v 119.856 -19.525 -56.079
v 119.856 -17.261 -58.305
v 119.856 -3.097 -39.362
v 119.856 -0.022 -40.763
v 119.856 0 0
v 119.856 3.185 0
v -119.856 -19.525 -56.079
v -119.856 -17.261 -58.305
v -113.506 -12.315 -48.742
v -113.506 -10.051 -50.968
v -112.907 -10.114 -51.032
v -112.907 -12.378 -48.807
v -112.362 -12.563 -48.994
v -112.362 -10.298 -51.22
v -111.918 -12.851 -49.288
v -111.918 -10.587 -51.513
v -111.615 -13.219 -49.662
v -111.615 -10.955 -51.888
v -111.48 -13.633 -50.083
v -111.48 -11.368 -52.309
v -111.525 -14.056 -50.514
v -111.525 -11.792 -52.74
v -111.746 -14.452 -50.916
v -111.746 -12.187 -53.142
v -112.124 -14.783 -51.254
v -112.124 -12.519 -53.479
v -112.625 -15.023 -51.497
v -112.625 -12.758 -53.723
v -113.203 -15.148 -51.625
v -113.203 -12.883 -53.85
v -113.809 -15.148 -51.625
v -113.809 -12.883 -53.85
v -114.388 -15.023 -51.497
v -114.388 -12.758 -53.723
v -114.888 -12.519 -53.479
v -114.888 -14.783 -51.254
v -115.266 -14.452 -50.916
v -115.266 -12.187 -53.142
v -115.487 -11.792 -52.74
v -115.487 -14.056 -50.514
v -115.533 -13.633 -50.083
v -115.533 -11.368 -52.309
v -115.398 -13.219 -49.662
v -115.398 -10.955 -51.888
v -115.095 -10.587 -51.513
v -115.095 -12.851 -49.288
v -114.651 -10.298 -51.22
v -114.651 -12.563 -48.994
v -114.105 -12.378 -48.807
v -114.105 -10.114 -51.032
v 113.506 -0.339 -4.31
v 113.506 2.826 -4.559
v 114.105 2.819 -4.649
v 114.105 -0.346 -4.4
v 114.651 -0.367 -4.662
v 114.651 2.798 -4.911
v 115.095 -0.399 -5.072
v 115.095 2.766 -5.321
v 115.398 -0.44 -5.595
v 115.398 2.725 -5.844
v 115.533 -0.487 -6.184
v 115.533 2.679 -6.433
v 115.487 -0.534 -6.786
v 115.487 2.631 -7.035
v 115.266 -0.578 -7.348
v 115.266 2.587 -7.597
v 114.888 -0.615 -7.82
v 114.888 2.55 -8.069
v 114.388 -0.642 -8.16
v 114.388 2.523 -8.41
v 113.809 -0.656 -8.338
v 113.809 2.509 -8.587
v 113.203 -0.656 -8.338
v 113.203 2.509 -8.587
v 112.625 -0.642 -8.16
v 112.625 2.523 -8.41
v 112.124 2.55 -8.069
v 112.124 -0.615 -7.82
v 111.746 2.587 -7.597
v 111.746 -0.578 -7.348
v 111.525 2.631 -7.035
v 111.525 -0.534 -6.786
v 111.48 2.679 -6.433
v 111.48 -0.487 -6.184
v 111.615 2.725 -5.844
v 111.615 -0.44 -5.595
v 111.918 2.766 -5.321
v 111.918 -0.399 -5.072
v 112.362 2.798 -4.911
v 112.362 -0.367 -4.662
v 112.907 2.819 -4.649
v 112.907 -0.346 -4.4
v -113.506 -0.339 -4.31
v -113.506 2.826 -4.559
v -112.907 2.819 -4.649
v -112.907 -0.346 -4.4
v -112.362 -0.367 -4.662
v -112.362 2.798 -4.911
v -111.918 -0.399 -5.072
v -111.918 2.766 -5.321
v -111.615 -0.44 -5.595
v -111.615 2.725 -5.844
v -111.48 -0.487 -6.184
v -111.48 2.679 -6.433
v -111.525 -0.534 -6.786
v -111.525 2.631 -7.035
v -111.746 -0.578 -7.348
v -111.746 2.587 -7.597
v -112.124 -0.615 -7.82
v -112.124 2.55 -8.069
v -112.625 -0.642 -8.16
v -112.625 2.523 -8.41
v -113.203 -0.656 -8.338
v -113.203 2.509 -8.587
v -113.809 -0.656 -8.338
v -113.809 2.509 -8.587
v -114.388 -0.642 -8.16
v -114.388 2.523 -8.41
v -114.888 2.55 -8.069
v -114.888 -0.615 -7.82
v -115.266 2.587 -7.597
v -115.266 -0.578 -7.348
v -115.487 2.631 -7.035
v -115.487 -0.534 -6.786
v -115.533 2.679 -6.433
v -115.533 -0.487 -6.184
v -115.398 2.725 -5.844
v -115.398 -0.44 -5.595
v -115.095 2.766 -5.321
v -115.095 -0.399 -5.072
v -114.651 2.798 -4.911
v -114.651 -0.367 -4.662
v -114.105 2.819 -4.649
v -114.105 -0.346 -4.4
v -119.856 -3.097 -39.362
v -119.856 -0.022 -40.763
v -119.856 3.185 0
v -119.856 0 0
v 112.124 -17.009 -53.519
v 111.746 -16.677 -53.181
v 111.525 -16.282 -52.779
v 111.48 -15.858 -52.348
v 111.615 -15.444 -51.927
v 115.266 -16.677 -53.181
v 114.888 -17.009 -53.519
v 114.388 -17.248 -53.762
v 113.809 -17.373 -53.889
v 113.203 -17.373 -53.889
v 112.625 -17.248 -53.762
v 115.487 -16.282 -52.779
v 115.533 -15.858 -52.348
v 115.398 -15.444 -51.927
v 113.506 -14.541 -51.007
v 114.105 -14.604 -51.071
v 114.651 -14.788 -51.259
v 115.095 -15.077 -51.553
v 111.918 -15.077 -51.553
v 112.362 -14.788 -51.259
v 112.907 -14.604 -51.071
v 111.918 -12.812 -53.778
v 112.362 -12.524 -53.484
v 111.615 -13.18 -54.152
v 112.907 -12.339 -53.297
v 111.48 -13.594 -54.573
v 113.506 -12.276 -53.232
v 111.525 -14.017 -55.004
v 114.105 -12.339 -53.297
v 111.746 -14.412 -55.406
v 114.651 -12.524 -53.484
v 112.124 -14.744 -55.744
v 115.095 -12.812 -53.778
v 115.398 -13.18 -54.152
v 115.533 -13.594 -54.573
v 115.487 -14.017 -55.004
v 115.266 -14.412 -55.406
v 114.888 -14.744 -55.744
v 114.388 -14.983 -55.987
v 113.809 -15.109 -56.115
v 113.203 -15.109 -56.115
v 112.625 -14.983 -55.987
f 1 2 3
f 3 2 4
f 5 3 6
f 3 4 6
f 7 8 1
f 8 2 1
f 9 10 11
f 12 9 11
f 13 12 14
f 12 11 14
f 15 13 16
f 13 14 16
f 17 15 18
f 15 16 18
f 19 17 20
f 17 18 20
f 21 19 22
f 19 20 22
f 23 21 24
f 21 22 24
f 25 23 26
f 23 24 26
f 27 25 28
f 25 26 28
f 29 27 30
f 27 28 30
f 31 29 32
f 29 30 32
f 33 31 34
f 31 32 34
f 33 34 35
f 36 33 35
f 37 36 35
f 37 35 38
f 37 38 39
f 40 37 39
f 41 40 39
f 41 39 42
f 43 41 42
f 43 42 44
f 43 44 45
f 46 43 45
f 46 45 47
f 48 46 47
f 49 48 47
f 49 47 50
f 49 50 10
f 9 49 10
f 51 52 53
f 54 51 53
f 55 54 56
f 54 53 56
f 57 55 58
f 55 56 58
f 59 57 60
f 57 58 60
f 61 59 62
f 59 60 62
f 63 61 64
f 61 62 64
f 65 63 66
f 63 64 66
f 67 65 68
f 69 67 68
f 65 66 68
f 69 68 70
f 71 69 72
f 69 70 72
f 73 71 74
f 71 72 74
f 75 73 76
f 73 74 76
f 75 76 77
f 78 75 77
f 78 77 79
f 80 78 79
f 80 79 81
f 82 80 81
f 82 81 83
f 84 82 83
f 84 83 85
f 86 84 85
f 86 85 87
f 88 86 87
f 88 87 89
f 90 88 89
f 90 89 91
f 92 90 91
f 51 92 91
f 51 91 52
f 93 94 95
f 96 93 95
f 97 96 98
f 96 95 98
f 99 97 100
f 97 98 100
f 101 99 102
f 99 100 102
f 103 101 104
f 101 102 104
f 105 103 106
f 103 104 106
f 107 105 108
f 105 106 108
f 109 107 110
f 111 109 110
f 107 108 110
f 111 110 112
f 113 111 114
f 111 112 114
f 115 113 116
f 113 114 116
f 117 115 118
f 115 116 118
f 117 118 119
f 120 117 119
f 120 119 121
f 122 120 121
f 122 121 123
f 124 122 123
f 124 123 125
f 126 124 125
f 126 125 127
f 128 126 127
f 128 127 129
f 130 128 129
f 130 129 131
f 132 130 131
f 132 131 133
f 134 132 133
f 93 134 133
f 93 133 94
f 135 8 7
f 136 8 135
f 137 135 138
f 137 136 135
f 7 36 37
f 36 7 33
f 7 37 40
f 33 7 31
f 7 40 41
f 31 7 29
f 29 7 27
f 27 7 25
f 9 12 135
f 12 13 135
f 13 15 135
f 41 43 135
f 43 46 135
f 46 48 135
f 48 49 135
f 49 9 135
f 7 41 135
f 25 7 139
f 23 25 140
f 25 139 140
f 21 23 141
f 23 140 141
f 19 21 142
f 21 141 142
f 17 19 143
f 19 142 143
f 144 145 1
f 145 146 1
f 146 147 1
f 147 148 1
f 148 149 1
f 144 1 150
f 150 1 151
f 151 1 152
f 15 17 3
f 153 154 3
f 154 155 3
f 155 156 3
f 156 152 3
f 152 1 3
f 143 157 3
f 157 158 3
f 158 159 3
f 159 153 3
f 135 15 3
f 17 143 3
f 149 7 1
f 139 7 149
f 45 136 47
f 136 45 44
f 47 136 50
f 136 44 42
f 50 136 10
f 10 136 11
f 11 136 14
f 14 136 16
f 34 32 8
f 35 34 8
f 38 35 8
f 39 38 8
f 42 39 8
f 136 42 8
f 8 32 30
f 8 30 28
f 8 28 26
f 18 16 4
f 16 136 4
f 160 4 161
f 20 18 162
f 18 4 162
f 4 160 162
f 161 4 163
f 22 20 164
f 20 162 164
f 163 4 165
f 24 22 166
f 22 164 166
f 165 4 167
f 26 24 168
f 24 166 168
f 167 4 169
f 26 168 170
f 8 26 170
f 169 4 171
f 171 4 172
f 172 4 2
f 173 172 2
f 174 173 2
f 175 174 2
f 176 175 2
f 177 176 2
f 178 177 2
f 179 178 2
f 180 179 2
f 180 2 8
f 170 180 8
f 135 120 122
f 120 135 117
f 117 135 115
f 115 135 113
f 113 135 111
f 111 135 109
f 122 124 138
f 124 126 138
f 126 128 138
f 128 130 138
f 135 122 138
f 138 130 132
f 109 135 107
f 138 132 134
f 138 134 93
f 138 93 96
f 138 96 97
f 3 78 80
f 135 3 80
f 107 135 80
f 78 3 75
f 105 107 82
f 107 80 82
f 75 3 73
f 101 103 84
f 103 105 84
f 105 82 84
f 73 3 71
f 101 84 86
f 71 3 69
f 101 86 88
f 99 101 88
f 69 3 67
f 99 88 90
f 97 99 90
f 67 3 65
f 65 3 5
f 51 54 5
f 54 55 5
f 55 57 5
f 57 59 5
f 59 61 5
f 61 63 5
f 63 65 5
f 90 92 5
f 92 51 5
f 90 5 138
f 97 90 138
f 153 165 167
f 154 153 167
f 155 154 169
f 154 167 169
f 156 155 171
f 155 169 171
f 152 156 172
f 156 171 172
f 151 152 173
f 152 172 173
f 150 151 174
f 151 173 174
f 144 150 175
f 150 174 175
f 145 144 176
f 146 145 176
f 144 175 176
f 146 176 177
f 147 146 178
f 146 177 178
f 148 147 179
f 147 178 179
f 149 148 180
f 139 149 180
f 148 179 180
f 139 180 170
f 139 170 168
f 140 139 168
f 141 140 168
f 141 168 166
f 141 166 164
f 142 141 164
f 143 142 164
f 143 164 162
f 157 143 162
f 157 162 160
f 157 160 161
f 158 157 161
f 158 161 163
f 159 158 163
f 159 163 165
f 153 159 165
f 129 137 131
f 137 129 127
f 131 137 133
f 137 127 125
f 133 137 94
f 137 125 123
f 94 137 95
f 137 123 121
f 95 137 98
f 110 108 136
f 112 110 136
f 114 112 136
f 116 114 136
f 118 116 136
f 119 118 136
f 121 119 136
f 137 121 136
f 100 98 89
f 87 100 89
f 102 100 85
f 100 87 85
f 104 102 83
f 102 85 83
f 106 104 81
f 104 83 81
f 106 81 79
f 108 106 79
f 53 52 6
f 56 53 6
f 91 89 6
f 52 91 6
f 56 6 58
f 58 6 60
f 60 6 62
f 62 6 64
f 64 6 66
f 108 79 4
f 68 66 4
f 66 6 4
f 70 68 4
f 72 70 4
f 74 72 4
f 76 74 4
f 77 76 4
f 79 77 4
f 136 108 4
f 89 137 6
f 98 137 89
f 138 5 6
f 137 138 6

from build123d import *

# Parameters (mm, degrees)
BOSS_EXTRUDE1_DEPTH = 119.85625
SKETCH2_R           = 2.032
CUT_EXTRUDE1_DEPTH  = 136.095780221
SKETCH3_R           = 2.032
CUT_EXTRUDE2_DEPTH  = 12.7


with BuildPart() as part:
    # Sketch1 → Boss-Extrude1 (new, symmetric)
    with BuildSketch(Plane(origin=(0, 0, 0), x_dir=(0, 0, -1), z_dir=(1, 0, 0))):
        Polygon((0, 0), (0, 3.184811635), (40.762900177, -0.022300578), (58.304880654, -17.260912049), (56.079483543, -19.525472204), (39.361772519, -3.096875365), align=None)
    extrude(amount=BOSS_EXTRUDE1_DEPTH, both=True)

    # Sketch2 → Cut-Extrude1 (cut, through all)
    with BuildSketch(Plane(origin=(0, 3.165218593, -0.249030642), x_dir=(1, 0, 0), z_dir=(0, 0.9969192417821154, -0.0784348478966589))):
        with Locations(Location((113.50625, 6.354926815, 0), (0, 0, 270))):
            Circle(SKETCH2_R)
        with Locations(Location((-113.50625, 6.354926815, 0), (0, 0, 270))):
            Circle(SKETCH2_R)
    extrude(amount=-CUT_EXTRUDE1_DEPTH, mode=Mode.SUBTRACT)

    # Sketch3 → Cut-Extrude2 (cut)
    with BuildSketch(Plane(origin=(0, 20.36700431, -20.014779664), x_dir=(1, 0, 0), z_dir=(0, 0.7132472930974809, -0.7009124759120187))):
        with Locations(Location((-113.50625, 45.429186901, 0), (0, 0, 270))):
            Circle(SKETCH3_R)
        with Locations(Location((113.50625, 48.604186901, 0), (0, 0, 270))):
            Circle(SKETCH3_R)
    extrude(amount=-CUT_EXTRUDE2_DEPTH, mode=Mode.SUBTRACT)


solid = part.part
